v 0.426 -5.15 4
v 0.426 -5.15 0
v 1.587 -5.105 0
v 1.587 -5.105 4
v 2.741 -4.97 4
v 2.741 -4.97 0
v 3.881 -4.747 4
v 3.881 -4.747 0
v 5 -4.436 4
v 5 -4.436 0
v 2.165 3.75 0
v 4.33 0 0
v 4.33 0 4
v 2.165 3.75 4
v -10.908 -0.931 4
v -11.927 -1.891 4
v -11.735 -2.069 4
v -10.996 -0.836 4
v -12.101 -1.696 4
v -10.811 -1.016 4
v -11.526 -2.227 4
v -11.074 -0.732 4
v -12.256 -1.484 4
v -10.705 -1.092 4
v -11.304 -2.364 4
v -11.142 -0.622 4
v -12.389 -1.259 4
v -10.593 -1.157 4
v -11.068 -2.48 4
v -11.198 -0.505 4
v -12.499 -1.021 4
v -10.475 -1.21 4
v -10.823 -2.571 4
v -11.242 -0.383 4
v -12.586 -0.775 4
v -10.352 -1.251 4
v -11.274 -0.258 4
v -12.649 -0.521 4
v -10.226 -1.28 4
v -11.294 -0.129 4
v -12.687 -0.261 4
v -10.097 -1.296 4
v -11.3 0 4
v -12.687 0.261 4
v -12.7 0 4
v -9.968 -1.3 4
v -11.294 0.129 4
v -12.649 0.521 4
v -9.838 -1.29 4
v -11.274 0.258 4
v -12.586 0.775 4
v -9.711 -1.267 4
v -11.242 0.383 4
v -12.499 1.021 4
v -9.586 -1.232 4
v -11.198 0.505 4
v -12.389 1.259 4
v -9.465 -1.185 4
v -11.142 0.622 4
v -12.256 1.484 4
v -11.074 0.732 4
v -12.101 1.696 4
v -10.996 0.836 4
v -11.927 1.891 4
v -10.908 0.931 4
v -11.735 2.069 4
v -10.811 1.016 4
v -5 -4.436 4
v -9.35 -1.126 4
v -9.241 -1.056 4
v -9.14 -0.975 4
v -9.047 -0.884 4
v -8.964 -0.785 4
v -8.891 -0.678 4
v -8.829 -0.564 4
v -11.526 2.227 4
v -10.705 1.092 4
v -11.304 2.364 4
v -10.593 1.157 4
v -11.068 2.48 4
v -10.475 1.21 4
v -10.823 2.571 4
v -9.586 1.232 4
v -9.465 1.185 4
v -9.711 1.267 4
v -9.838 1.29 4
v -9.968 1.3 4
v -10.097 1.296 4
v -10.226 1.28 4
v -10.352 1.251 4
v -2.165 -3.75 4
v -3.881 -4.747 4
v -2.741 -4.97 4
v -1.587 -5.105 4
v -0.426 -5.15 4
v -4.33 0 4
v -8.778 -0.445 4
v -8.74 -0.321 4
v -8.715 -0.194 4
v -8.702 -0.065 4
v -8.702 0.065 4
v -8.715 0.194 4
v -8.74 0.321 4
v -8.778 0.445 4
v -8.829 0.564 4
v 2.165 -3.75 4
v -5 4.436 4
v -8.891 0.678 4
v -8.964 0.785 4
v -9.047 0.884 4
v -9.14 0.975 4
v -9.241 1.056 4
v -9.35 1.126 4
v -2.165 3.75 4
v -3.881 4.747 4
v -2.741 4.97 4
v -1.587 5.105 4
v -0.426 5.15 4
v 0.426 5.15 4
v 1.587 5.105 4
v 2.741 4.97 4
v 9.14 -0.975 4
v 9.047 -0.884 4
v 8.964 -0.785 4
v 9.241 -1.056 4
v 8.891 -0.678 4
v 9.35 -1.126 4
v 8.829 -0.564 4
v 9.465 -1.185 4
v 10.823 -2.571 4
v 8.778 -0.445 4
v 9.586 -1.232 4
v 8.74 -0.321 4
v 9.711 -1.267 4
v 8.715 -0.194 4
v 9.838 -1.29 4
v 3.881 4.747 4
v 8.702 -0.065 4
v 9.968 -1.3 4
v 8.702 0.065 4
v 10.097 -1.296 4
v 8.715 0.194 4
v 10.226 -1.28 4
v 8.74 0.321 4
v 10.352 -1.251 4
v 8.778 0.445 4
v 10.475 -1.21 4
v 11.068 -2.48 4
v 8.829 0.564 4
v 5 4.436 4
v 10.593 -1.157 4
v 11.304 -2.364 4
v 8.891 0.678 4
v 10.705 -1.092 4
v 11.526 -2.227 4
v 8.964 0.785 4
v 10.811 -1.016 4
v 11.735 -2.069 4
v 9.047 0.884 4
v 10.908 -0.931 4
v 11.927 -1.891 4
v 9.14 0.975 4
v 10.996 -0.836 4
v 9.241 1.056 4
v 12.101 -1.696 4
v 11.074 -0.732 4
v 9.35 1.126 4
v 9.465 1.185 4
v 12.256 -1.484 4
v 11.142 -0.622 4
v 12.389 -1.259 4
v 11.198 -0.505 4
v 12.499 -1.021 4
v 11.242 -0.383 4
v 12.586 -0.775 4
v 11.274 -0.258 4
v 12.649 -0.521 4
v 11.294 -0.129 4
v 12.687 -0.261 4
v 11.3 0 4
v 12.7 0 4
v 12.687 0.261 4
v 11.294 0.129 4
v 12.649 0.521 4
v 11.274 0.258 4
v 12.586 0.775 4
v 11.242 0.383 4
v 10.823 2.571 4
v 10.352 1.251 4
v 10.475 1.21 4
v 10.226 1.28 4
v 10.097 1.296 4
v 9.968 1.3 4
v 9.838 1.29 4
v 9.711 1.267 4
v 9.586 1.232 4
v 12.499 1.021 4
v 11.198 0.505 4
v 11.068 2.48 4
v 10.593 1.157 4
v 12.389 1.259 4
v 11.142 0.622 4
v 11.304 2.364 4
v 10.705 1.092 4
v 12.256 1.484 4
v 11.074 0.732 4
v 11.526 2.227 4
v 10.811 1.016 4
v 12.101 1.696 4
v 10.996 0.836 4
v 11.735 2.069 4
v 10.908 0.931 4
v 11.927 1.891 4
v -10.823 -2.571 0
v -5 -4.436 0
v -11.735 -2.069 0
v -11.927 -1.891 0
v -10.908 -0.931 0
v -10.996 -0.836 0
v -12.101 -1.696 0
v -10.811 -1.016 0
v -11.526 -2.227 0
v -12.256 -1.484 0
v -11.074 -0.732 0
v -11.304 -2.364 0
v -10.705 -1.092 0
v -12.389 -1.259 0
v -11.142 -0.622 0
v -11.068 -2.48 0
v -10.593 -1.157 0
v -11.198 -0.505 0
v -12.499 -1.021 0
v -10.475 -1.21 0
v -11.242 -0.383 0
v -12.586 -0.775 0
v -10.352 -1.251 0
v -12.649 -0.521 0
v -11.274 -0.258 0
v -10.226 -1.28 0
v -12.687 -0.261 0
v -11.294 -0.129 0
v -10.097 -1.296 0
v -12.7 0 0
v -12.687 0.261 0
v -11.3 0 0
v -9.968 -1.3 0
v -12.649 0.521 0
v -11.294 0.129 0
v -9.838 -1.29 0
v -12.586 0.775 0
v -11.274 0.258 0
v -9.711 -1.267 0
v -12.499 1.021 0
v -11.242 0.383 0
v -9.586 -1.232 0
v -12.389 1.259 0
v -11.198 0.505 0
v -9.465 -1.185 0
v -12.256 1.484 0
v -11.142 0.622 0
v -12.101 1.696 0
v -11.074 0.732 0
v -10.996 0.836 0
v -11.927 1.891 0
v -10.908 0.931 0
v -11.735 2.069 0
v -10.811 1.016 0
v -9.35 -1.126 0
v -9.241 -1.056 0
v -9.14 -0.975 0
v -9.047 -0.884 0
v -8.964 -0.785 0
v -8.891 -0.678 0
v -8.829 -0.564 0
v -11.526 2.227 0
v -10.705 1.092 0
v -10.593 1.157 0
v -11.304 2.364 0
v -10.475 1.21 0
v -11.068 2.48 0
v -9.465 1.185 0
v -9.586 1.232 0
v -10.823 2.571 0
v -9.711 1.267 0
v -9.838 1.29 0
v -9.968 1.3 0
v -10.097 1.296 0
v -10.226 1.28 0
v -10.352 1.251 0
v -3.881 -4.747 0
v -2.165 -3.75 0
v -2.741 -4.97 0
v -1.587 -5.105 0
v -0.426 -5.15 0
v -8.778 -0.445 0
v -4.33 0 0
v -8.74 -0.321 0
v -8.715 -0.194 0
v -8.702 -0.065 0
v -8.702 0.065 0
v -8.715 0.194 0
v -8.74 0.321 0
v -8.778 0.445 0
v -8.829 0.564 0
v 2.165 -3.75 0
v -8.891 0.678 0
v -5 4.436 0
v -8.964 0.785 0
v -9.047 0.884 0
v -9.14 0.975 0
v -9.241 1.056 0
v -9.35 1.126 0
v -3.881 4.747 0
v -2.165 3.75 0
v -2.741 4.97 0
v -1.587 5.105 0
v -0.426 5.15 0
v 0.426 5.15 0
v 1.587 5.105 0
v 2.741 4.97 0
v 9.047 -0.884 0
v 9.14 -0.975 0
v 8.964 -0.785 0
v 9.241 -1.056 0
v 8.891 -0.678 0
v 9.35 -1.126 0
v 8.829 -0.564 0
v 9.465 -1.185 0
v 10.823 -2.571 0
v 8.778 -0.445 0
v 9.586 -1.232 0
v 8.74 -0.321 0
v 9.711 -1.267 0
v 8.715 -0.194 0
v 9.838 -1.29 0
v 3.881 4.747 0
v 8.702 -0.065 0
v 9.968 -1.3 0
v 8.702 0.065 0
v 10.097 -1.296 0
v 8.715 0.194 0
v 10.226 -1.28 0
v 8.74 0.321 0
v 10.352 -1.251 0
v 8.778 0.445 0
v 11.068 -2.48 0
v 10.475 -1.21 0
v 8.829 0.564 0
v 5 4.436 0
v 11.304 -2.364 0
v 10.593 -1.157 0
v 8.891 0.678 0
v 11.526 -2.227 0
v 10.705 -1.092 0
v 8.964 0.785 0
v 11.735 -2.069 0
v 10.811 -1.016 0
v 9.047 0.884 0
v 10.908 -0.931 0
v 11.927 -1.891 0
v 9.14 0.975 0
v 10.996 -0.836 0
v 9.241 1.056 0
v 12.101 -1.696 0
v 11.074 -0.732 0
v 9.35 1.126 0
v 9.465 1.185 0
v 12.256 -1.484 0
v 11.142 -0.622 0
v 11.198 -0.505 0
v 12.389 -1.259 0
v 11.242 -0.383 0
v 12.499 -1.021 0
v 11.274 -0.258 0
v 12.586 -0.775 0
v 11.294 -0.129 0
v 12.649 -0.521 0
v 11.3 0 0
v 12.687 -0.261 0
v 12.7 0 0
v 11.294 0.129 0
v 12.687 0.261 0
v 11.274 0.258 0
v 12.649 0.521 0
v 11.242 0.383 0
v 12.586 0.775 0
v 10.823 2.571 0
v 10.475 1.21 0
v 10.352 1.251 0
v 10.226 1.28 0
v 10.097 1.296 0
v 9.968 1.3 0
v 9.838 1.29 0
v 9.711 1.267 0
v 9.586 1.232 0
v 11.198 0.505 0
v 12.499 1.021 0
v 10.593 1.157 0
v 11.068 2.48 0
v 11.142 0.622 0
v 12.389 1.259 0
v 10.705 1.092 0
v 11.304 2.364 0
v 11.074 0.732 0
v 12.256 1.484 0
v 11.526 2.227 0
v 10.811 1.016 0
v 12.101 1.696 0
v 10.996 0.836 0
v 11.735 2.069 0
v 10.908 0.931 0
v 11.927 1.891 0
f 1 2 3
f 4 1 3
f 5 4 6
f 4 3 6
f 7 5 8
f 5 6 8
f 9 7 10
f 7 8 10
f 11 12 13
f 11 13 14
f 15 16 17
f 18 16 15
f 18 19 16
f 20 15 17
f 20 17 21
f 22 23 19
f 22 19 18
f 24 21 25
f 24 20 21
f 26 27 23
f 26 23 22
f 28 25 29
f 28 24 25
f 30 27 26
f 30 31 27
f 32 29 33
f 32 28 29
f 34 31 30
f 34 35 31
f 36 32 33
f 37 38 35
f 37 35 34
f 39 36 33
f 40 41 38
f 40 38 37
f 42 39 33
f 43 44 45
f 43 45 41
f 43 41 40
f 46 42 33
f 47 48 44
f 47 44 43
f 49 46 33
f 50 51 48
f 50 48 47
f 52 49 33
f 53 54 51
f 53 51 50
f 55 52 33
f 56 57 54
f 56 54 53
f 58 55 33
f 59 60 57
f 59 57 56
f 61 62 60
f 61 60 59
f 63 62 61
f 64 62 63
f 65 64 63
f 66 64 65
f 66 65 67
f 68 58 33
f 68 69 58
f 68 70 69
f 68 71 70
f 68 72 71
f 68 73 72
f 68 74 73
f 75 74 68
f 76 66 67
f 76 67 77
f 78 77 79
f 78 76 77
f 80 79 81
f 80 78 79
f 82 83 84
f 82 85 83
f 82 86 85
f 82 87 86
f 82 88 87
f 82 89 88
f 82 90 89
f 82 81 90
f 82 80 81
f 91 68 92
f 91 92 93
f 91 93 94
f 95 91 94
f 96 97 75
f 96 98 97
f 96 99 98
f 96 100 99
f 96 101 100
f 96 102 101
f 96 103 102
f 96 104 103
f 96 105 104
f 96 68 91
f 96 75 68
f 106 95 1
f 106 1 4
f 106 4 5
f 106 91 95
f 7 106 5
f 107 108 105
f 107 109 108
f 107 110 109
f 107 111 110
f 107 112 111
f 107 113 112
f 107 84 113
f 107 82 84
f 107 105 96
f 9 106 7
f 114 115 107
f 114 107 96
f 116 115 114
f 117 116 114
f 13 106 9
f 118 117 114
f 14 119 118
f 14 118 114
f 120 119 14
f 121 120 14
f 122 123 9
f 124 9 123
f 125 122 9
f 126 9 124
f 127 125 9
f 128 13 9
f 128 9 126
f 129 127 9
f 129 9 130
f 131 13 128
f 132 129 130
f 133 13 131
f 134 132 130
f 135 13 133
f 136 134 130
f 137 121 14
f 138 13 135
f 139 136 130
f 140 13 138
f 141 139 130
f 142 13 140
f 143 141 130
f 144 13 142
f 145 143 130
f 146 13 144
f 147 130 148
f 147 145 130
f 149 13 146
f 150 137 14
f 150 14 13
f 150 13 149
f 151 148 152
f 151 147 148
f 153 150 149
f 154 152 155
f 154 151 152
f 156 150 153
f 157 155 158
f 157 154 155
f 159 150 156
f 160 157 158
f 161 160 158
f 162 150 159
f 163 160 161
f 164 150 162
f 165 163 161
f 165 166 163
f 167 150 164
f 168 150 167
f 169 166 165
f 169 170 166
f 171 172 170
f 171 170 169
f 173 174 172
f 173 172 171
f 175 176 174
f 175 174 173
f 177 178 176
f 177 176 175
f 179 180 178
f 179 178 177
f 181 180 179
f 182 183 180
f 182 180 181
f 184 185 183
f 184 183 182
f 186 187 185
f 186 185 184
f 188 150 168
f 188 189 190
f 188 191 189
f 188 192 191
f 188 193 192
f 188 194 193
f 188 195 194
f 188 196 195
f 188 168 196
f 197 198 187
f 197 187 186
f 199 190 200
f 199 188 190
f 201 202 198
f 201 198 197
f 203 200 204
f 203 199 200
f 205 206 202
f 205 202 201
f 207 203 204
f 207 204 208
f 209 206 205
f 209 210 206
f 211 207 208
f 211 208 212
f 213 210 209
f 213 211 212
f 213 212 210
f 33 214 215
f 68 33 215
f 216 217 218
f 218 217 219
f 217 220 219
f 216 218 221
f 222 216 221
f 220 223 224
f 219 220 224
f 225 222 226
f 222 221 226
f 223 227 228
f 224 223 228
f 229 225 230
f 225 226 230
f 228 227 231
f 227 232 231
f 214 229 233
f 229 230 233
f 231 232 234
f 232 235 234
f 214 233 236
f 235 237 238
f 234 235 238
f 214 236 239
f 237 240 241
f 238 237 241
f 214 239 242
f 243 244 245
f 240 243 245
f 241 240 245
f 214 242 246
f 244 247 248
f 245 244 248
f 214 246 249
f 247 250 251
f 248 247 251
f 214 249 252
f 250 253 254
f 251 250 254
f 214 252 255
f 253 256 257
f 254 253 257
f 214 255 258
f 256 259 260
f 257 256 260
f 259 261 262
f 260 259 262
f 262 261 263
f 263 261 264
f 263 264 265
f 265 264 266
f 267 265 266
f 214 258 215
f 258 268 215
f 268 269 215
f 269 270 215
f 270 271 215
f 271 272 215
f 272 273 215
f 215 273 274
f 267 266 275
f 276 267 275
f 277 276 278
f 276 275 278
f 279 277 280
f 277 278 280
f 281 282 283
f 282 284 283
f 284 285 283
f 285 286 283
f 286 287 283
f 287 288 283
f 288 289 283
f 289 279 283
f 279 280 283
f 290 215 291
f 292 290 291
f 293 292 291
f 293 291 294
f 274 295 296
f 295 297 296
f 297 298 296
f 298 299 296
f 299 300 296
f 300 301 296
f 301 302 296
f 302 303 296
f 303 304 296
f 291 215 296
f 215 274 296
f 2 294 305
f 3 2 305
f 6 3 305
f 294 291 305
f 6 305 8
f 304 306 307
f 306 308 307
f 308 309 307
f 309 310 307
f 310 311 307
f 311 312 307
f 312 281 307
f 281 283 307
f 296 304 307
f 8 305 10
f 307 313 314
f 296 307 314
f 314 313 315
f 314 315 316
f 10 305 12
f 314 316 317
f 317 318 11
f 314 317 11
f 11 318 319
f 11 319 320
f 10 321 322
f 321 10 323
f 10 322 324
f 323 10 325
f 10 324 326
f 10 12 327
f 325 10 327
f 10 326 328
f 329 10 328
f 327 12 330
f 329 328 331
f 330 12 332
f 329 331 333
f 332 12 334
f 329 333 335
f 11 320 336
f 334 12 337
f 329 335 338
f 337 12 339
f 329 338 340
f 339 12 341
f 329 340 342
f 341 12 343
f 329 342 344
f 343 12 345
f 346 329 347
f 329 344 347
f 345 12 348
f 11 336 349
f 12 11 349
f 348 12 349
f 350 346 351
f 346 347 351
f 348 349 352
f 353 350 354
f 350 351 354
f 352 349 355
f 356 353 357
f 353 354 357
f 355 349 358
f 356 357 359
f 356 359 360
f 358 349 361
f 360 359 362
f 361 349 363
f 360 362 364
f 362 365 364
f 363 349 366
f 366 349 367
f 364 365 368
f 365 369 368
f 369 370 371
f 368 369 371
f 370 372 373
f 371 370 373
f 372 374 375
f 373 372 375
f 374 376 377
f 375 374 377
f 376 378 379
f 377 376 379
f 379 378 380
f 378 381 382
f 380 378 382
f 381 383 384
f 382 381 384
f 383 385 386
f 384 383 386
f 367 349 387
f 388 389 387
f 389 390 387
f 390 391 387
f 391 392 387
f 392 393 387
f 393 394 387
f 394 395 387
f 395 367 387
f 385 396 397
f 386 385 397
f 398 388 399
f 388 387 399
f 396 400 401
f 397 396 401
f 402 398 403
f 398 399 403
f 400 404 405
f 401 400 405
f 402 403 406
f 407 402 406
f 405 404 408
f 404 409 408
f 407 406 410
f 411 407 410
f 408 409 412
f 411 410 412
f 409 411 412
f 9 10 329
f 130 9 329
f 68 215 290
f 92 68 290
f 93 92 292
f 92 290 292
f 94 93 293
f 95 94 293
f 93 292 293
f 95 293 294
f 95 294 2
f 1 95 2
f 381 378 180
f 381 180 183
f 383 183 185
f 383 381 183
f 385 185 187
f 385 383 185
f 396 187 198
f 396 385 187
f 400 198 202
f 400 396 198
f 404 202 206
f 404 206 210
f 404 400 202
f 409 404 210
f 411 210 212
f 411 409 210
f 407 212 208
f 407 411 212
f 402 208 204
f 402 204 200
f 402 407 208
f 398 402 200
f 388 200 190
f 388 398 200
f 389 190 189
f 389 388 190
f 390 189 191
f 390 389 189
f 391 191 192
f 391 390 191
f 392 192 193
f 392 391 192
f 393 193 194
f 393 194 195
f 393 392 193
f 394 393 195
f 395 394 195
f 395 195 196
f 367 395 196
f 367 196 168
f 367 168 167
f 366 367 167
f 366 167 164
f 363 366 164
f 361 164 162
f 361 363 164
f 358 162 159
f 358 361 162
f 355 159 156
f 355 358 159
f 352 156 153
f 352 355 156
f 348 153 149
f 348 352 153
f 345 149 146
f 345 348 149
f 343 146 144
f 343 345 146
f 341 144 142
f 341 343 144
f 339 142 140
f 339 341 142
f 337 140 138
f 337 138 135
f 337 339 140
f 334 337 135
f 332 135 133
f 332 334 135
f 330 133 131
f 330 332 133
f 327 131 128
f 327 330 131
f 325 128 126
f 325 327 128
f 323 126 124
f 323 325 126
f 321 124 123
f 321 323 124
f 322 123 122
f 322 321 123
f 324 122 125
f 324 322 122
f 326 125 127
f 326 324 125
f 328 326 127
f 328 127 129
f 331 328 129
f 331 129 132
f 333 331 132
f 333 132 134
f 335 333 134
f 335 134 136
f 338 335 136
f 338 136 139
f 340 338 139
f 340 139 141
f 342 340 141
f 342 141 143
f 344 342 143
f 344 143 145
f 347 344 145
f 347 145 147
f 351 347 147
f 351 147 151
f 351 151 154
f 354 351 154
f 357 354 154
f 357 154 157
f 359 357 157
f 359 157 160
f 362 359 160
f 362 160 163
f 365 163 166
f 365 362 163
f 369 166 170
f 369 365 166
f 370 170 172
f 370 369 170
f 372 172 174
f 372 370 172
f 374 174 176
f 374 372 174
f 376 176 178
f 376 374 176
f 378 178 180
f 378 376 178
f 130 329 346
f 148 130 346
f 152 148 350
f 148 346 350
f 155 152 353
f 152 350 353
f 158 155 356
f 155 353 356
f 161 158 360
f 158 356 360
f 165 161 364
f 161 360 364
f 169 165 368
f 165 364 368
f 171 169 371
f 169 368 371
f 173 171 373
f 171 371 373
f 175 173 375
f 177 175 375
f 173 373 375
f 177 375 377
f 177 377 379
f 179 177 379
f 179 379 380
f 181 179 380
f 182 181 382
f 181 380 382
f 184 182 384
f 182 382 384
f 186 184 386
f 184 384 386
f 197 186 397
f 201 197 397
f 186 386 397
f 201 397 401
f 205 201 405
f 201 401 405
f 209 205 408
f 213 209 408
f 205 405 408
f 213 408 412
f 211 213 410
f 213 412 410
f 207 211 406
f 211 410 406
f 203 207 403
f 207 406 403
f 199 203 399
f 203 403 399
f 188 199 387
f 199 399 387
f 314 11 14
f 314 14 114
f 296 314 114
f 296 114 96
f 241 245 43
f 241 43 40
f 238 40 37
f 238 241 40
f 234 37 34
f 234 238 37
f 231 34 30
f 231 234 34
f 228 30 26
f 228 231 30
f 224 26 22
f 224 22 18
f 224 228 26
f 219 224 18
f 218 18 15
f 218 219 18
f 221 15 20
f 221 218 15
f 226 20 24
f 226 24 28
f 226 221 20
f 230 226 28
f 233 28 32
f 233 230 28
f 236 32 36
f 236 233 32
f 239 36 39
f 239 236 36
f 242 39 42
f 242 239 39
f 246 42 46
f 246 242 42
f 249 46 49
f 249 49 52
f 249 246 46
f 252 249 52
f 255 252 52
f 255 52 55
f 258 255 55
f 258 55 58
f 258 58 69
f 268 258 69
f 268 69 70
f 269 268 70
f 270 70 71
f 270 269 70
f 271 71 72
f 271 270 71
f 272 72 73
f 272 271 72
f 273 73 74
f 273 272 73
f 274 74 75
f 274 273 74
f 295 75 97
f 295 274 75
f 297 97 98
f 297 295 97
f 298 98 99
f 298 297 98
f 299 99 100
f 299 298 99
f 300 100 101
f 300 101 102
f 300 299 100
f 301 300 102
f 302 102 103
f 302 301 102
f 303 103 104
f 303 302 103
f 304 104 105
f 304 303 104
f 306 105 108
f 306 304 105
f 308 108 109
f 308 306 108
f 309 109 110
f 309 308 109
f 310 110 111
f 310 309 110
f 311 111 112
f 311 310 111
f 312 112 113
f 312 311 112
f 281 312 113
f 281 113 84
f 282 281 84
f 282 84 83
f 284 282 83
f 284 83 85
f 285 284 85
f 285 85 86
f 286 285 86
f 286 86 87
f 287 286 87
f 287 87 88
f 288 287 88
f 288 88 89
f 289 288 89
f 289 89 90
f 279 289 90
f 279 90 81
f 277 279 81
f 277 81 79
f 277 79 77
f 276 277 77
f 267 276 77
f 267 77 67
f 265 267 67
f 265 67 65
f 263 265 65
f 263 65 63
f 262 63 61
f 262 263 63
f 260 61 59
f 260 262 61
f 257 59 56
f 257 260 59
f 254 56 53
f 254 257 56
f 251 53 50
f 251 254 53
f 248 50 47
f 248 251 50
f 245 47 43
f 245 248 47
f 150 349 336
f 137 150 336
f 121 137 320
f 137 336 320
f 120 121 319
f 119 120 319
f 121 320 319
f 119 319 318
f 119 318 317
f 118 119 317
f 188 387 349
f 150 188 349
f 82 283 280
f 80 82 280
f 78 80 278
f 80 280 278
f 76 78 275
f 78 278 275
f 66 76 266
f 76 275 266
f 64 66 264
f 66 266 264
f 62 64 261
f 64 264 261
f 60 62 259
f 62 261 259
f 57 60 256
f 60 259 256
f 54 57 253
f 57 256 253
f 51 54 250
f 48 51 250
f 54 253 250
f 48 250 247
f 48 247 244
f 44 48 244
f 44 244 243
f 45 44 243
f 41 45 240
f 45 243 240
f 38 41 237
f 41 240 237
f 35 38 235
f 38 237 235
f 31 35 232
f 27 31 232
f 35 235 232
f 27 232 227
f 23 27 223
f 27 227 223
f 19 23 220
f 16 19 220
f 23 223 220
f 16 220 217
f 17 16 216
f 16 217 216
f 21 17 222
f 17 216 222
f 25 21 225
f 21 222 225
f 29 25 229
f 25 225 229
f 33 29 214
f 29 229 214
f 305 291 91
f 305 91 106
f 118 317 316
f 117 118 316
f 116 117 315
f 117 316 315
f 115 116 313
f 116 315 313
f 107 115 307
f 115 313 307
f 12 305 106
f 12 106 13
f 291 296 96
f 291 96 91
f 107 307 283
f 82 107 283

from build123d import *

# Parameters (mm, degrees)
SKETCH1_R           = 1.3
BOSS_EXTRUDE1_DEPTH = 4


with BuildPart() as part:
    # Sketch1 → Boss-Extrude1 (new body)
    with BuildSketch(Plane.XY):
        with BuildLine():
            Line((10.823243212, 2.571433572), (5, 4.435742065))
            ThreePointArc((5, 4.435742065), (2.74093184, 4.97035983), (0.426426599, 5.15))
            Line((0.426426599, 5.15), (-0.426426599, 5.15))
            ThreePointArc((-0.426426599, 5.15), (-2.74093184, 4.97035983), (-5, 4.435742065))
            Line((-5, 4.435742065), (-10.823243212, 2.571433572))
            ThreePointArc((-10.823243212, 2.571433572), (-12.7, 0), (-10.823243212, -2.571433572))
            Line((-10.823243212, -2.571433572), (-5, -4.435742065))
            ThreePointArc((-5, -4.435742065), (-2.74093184, -4.97035983), (-0.426426599, -5.15))
            Line((-0.426426599, -5.15), (0.426426599, -5.15))
            ThreePointArc((0.426426599, -5.15), (2.74093184, -4.97035983), (5, -4.435742065))
            Line((5, -4.435742065), (10.823243212, -2.571433572))
            ThreePointArc((10.823243212, -2.571433572), (12.7, 0), (10.823243212, 2.571433572))
        make_face()
        with Locations((10, 0)):
            Circle(SKETCH1_R, mode=Mode.SUBTRACT)
        with Locations(Location((-10, 0, 0), (0, 0, 180))):
            Circle(SKETCH1_R, mode=Mode.SUBTRACT)
        Polygon((2.165063509, 3.75), (-2.165063509, 3.75), (-4.330127019, 0), (-2.165063509, -3.75), (2.165063509, -3.75), (4.330127019, 0), align=None, mode=Mode.SUBTRACT)
    extrude(amount=BOSS_EXTRUDE1_DEPTH)


solid = part.part
